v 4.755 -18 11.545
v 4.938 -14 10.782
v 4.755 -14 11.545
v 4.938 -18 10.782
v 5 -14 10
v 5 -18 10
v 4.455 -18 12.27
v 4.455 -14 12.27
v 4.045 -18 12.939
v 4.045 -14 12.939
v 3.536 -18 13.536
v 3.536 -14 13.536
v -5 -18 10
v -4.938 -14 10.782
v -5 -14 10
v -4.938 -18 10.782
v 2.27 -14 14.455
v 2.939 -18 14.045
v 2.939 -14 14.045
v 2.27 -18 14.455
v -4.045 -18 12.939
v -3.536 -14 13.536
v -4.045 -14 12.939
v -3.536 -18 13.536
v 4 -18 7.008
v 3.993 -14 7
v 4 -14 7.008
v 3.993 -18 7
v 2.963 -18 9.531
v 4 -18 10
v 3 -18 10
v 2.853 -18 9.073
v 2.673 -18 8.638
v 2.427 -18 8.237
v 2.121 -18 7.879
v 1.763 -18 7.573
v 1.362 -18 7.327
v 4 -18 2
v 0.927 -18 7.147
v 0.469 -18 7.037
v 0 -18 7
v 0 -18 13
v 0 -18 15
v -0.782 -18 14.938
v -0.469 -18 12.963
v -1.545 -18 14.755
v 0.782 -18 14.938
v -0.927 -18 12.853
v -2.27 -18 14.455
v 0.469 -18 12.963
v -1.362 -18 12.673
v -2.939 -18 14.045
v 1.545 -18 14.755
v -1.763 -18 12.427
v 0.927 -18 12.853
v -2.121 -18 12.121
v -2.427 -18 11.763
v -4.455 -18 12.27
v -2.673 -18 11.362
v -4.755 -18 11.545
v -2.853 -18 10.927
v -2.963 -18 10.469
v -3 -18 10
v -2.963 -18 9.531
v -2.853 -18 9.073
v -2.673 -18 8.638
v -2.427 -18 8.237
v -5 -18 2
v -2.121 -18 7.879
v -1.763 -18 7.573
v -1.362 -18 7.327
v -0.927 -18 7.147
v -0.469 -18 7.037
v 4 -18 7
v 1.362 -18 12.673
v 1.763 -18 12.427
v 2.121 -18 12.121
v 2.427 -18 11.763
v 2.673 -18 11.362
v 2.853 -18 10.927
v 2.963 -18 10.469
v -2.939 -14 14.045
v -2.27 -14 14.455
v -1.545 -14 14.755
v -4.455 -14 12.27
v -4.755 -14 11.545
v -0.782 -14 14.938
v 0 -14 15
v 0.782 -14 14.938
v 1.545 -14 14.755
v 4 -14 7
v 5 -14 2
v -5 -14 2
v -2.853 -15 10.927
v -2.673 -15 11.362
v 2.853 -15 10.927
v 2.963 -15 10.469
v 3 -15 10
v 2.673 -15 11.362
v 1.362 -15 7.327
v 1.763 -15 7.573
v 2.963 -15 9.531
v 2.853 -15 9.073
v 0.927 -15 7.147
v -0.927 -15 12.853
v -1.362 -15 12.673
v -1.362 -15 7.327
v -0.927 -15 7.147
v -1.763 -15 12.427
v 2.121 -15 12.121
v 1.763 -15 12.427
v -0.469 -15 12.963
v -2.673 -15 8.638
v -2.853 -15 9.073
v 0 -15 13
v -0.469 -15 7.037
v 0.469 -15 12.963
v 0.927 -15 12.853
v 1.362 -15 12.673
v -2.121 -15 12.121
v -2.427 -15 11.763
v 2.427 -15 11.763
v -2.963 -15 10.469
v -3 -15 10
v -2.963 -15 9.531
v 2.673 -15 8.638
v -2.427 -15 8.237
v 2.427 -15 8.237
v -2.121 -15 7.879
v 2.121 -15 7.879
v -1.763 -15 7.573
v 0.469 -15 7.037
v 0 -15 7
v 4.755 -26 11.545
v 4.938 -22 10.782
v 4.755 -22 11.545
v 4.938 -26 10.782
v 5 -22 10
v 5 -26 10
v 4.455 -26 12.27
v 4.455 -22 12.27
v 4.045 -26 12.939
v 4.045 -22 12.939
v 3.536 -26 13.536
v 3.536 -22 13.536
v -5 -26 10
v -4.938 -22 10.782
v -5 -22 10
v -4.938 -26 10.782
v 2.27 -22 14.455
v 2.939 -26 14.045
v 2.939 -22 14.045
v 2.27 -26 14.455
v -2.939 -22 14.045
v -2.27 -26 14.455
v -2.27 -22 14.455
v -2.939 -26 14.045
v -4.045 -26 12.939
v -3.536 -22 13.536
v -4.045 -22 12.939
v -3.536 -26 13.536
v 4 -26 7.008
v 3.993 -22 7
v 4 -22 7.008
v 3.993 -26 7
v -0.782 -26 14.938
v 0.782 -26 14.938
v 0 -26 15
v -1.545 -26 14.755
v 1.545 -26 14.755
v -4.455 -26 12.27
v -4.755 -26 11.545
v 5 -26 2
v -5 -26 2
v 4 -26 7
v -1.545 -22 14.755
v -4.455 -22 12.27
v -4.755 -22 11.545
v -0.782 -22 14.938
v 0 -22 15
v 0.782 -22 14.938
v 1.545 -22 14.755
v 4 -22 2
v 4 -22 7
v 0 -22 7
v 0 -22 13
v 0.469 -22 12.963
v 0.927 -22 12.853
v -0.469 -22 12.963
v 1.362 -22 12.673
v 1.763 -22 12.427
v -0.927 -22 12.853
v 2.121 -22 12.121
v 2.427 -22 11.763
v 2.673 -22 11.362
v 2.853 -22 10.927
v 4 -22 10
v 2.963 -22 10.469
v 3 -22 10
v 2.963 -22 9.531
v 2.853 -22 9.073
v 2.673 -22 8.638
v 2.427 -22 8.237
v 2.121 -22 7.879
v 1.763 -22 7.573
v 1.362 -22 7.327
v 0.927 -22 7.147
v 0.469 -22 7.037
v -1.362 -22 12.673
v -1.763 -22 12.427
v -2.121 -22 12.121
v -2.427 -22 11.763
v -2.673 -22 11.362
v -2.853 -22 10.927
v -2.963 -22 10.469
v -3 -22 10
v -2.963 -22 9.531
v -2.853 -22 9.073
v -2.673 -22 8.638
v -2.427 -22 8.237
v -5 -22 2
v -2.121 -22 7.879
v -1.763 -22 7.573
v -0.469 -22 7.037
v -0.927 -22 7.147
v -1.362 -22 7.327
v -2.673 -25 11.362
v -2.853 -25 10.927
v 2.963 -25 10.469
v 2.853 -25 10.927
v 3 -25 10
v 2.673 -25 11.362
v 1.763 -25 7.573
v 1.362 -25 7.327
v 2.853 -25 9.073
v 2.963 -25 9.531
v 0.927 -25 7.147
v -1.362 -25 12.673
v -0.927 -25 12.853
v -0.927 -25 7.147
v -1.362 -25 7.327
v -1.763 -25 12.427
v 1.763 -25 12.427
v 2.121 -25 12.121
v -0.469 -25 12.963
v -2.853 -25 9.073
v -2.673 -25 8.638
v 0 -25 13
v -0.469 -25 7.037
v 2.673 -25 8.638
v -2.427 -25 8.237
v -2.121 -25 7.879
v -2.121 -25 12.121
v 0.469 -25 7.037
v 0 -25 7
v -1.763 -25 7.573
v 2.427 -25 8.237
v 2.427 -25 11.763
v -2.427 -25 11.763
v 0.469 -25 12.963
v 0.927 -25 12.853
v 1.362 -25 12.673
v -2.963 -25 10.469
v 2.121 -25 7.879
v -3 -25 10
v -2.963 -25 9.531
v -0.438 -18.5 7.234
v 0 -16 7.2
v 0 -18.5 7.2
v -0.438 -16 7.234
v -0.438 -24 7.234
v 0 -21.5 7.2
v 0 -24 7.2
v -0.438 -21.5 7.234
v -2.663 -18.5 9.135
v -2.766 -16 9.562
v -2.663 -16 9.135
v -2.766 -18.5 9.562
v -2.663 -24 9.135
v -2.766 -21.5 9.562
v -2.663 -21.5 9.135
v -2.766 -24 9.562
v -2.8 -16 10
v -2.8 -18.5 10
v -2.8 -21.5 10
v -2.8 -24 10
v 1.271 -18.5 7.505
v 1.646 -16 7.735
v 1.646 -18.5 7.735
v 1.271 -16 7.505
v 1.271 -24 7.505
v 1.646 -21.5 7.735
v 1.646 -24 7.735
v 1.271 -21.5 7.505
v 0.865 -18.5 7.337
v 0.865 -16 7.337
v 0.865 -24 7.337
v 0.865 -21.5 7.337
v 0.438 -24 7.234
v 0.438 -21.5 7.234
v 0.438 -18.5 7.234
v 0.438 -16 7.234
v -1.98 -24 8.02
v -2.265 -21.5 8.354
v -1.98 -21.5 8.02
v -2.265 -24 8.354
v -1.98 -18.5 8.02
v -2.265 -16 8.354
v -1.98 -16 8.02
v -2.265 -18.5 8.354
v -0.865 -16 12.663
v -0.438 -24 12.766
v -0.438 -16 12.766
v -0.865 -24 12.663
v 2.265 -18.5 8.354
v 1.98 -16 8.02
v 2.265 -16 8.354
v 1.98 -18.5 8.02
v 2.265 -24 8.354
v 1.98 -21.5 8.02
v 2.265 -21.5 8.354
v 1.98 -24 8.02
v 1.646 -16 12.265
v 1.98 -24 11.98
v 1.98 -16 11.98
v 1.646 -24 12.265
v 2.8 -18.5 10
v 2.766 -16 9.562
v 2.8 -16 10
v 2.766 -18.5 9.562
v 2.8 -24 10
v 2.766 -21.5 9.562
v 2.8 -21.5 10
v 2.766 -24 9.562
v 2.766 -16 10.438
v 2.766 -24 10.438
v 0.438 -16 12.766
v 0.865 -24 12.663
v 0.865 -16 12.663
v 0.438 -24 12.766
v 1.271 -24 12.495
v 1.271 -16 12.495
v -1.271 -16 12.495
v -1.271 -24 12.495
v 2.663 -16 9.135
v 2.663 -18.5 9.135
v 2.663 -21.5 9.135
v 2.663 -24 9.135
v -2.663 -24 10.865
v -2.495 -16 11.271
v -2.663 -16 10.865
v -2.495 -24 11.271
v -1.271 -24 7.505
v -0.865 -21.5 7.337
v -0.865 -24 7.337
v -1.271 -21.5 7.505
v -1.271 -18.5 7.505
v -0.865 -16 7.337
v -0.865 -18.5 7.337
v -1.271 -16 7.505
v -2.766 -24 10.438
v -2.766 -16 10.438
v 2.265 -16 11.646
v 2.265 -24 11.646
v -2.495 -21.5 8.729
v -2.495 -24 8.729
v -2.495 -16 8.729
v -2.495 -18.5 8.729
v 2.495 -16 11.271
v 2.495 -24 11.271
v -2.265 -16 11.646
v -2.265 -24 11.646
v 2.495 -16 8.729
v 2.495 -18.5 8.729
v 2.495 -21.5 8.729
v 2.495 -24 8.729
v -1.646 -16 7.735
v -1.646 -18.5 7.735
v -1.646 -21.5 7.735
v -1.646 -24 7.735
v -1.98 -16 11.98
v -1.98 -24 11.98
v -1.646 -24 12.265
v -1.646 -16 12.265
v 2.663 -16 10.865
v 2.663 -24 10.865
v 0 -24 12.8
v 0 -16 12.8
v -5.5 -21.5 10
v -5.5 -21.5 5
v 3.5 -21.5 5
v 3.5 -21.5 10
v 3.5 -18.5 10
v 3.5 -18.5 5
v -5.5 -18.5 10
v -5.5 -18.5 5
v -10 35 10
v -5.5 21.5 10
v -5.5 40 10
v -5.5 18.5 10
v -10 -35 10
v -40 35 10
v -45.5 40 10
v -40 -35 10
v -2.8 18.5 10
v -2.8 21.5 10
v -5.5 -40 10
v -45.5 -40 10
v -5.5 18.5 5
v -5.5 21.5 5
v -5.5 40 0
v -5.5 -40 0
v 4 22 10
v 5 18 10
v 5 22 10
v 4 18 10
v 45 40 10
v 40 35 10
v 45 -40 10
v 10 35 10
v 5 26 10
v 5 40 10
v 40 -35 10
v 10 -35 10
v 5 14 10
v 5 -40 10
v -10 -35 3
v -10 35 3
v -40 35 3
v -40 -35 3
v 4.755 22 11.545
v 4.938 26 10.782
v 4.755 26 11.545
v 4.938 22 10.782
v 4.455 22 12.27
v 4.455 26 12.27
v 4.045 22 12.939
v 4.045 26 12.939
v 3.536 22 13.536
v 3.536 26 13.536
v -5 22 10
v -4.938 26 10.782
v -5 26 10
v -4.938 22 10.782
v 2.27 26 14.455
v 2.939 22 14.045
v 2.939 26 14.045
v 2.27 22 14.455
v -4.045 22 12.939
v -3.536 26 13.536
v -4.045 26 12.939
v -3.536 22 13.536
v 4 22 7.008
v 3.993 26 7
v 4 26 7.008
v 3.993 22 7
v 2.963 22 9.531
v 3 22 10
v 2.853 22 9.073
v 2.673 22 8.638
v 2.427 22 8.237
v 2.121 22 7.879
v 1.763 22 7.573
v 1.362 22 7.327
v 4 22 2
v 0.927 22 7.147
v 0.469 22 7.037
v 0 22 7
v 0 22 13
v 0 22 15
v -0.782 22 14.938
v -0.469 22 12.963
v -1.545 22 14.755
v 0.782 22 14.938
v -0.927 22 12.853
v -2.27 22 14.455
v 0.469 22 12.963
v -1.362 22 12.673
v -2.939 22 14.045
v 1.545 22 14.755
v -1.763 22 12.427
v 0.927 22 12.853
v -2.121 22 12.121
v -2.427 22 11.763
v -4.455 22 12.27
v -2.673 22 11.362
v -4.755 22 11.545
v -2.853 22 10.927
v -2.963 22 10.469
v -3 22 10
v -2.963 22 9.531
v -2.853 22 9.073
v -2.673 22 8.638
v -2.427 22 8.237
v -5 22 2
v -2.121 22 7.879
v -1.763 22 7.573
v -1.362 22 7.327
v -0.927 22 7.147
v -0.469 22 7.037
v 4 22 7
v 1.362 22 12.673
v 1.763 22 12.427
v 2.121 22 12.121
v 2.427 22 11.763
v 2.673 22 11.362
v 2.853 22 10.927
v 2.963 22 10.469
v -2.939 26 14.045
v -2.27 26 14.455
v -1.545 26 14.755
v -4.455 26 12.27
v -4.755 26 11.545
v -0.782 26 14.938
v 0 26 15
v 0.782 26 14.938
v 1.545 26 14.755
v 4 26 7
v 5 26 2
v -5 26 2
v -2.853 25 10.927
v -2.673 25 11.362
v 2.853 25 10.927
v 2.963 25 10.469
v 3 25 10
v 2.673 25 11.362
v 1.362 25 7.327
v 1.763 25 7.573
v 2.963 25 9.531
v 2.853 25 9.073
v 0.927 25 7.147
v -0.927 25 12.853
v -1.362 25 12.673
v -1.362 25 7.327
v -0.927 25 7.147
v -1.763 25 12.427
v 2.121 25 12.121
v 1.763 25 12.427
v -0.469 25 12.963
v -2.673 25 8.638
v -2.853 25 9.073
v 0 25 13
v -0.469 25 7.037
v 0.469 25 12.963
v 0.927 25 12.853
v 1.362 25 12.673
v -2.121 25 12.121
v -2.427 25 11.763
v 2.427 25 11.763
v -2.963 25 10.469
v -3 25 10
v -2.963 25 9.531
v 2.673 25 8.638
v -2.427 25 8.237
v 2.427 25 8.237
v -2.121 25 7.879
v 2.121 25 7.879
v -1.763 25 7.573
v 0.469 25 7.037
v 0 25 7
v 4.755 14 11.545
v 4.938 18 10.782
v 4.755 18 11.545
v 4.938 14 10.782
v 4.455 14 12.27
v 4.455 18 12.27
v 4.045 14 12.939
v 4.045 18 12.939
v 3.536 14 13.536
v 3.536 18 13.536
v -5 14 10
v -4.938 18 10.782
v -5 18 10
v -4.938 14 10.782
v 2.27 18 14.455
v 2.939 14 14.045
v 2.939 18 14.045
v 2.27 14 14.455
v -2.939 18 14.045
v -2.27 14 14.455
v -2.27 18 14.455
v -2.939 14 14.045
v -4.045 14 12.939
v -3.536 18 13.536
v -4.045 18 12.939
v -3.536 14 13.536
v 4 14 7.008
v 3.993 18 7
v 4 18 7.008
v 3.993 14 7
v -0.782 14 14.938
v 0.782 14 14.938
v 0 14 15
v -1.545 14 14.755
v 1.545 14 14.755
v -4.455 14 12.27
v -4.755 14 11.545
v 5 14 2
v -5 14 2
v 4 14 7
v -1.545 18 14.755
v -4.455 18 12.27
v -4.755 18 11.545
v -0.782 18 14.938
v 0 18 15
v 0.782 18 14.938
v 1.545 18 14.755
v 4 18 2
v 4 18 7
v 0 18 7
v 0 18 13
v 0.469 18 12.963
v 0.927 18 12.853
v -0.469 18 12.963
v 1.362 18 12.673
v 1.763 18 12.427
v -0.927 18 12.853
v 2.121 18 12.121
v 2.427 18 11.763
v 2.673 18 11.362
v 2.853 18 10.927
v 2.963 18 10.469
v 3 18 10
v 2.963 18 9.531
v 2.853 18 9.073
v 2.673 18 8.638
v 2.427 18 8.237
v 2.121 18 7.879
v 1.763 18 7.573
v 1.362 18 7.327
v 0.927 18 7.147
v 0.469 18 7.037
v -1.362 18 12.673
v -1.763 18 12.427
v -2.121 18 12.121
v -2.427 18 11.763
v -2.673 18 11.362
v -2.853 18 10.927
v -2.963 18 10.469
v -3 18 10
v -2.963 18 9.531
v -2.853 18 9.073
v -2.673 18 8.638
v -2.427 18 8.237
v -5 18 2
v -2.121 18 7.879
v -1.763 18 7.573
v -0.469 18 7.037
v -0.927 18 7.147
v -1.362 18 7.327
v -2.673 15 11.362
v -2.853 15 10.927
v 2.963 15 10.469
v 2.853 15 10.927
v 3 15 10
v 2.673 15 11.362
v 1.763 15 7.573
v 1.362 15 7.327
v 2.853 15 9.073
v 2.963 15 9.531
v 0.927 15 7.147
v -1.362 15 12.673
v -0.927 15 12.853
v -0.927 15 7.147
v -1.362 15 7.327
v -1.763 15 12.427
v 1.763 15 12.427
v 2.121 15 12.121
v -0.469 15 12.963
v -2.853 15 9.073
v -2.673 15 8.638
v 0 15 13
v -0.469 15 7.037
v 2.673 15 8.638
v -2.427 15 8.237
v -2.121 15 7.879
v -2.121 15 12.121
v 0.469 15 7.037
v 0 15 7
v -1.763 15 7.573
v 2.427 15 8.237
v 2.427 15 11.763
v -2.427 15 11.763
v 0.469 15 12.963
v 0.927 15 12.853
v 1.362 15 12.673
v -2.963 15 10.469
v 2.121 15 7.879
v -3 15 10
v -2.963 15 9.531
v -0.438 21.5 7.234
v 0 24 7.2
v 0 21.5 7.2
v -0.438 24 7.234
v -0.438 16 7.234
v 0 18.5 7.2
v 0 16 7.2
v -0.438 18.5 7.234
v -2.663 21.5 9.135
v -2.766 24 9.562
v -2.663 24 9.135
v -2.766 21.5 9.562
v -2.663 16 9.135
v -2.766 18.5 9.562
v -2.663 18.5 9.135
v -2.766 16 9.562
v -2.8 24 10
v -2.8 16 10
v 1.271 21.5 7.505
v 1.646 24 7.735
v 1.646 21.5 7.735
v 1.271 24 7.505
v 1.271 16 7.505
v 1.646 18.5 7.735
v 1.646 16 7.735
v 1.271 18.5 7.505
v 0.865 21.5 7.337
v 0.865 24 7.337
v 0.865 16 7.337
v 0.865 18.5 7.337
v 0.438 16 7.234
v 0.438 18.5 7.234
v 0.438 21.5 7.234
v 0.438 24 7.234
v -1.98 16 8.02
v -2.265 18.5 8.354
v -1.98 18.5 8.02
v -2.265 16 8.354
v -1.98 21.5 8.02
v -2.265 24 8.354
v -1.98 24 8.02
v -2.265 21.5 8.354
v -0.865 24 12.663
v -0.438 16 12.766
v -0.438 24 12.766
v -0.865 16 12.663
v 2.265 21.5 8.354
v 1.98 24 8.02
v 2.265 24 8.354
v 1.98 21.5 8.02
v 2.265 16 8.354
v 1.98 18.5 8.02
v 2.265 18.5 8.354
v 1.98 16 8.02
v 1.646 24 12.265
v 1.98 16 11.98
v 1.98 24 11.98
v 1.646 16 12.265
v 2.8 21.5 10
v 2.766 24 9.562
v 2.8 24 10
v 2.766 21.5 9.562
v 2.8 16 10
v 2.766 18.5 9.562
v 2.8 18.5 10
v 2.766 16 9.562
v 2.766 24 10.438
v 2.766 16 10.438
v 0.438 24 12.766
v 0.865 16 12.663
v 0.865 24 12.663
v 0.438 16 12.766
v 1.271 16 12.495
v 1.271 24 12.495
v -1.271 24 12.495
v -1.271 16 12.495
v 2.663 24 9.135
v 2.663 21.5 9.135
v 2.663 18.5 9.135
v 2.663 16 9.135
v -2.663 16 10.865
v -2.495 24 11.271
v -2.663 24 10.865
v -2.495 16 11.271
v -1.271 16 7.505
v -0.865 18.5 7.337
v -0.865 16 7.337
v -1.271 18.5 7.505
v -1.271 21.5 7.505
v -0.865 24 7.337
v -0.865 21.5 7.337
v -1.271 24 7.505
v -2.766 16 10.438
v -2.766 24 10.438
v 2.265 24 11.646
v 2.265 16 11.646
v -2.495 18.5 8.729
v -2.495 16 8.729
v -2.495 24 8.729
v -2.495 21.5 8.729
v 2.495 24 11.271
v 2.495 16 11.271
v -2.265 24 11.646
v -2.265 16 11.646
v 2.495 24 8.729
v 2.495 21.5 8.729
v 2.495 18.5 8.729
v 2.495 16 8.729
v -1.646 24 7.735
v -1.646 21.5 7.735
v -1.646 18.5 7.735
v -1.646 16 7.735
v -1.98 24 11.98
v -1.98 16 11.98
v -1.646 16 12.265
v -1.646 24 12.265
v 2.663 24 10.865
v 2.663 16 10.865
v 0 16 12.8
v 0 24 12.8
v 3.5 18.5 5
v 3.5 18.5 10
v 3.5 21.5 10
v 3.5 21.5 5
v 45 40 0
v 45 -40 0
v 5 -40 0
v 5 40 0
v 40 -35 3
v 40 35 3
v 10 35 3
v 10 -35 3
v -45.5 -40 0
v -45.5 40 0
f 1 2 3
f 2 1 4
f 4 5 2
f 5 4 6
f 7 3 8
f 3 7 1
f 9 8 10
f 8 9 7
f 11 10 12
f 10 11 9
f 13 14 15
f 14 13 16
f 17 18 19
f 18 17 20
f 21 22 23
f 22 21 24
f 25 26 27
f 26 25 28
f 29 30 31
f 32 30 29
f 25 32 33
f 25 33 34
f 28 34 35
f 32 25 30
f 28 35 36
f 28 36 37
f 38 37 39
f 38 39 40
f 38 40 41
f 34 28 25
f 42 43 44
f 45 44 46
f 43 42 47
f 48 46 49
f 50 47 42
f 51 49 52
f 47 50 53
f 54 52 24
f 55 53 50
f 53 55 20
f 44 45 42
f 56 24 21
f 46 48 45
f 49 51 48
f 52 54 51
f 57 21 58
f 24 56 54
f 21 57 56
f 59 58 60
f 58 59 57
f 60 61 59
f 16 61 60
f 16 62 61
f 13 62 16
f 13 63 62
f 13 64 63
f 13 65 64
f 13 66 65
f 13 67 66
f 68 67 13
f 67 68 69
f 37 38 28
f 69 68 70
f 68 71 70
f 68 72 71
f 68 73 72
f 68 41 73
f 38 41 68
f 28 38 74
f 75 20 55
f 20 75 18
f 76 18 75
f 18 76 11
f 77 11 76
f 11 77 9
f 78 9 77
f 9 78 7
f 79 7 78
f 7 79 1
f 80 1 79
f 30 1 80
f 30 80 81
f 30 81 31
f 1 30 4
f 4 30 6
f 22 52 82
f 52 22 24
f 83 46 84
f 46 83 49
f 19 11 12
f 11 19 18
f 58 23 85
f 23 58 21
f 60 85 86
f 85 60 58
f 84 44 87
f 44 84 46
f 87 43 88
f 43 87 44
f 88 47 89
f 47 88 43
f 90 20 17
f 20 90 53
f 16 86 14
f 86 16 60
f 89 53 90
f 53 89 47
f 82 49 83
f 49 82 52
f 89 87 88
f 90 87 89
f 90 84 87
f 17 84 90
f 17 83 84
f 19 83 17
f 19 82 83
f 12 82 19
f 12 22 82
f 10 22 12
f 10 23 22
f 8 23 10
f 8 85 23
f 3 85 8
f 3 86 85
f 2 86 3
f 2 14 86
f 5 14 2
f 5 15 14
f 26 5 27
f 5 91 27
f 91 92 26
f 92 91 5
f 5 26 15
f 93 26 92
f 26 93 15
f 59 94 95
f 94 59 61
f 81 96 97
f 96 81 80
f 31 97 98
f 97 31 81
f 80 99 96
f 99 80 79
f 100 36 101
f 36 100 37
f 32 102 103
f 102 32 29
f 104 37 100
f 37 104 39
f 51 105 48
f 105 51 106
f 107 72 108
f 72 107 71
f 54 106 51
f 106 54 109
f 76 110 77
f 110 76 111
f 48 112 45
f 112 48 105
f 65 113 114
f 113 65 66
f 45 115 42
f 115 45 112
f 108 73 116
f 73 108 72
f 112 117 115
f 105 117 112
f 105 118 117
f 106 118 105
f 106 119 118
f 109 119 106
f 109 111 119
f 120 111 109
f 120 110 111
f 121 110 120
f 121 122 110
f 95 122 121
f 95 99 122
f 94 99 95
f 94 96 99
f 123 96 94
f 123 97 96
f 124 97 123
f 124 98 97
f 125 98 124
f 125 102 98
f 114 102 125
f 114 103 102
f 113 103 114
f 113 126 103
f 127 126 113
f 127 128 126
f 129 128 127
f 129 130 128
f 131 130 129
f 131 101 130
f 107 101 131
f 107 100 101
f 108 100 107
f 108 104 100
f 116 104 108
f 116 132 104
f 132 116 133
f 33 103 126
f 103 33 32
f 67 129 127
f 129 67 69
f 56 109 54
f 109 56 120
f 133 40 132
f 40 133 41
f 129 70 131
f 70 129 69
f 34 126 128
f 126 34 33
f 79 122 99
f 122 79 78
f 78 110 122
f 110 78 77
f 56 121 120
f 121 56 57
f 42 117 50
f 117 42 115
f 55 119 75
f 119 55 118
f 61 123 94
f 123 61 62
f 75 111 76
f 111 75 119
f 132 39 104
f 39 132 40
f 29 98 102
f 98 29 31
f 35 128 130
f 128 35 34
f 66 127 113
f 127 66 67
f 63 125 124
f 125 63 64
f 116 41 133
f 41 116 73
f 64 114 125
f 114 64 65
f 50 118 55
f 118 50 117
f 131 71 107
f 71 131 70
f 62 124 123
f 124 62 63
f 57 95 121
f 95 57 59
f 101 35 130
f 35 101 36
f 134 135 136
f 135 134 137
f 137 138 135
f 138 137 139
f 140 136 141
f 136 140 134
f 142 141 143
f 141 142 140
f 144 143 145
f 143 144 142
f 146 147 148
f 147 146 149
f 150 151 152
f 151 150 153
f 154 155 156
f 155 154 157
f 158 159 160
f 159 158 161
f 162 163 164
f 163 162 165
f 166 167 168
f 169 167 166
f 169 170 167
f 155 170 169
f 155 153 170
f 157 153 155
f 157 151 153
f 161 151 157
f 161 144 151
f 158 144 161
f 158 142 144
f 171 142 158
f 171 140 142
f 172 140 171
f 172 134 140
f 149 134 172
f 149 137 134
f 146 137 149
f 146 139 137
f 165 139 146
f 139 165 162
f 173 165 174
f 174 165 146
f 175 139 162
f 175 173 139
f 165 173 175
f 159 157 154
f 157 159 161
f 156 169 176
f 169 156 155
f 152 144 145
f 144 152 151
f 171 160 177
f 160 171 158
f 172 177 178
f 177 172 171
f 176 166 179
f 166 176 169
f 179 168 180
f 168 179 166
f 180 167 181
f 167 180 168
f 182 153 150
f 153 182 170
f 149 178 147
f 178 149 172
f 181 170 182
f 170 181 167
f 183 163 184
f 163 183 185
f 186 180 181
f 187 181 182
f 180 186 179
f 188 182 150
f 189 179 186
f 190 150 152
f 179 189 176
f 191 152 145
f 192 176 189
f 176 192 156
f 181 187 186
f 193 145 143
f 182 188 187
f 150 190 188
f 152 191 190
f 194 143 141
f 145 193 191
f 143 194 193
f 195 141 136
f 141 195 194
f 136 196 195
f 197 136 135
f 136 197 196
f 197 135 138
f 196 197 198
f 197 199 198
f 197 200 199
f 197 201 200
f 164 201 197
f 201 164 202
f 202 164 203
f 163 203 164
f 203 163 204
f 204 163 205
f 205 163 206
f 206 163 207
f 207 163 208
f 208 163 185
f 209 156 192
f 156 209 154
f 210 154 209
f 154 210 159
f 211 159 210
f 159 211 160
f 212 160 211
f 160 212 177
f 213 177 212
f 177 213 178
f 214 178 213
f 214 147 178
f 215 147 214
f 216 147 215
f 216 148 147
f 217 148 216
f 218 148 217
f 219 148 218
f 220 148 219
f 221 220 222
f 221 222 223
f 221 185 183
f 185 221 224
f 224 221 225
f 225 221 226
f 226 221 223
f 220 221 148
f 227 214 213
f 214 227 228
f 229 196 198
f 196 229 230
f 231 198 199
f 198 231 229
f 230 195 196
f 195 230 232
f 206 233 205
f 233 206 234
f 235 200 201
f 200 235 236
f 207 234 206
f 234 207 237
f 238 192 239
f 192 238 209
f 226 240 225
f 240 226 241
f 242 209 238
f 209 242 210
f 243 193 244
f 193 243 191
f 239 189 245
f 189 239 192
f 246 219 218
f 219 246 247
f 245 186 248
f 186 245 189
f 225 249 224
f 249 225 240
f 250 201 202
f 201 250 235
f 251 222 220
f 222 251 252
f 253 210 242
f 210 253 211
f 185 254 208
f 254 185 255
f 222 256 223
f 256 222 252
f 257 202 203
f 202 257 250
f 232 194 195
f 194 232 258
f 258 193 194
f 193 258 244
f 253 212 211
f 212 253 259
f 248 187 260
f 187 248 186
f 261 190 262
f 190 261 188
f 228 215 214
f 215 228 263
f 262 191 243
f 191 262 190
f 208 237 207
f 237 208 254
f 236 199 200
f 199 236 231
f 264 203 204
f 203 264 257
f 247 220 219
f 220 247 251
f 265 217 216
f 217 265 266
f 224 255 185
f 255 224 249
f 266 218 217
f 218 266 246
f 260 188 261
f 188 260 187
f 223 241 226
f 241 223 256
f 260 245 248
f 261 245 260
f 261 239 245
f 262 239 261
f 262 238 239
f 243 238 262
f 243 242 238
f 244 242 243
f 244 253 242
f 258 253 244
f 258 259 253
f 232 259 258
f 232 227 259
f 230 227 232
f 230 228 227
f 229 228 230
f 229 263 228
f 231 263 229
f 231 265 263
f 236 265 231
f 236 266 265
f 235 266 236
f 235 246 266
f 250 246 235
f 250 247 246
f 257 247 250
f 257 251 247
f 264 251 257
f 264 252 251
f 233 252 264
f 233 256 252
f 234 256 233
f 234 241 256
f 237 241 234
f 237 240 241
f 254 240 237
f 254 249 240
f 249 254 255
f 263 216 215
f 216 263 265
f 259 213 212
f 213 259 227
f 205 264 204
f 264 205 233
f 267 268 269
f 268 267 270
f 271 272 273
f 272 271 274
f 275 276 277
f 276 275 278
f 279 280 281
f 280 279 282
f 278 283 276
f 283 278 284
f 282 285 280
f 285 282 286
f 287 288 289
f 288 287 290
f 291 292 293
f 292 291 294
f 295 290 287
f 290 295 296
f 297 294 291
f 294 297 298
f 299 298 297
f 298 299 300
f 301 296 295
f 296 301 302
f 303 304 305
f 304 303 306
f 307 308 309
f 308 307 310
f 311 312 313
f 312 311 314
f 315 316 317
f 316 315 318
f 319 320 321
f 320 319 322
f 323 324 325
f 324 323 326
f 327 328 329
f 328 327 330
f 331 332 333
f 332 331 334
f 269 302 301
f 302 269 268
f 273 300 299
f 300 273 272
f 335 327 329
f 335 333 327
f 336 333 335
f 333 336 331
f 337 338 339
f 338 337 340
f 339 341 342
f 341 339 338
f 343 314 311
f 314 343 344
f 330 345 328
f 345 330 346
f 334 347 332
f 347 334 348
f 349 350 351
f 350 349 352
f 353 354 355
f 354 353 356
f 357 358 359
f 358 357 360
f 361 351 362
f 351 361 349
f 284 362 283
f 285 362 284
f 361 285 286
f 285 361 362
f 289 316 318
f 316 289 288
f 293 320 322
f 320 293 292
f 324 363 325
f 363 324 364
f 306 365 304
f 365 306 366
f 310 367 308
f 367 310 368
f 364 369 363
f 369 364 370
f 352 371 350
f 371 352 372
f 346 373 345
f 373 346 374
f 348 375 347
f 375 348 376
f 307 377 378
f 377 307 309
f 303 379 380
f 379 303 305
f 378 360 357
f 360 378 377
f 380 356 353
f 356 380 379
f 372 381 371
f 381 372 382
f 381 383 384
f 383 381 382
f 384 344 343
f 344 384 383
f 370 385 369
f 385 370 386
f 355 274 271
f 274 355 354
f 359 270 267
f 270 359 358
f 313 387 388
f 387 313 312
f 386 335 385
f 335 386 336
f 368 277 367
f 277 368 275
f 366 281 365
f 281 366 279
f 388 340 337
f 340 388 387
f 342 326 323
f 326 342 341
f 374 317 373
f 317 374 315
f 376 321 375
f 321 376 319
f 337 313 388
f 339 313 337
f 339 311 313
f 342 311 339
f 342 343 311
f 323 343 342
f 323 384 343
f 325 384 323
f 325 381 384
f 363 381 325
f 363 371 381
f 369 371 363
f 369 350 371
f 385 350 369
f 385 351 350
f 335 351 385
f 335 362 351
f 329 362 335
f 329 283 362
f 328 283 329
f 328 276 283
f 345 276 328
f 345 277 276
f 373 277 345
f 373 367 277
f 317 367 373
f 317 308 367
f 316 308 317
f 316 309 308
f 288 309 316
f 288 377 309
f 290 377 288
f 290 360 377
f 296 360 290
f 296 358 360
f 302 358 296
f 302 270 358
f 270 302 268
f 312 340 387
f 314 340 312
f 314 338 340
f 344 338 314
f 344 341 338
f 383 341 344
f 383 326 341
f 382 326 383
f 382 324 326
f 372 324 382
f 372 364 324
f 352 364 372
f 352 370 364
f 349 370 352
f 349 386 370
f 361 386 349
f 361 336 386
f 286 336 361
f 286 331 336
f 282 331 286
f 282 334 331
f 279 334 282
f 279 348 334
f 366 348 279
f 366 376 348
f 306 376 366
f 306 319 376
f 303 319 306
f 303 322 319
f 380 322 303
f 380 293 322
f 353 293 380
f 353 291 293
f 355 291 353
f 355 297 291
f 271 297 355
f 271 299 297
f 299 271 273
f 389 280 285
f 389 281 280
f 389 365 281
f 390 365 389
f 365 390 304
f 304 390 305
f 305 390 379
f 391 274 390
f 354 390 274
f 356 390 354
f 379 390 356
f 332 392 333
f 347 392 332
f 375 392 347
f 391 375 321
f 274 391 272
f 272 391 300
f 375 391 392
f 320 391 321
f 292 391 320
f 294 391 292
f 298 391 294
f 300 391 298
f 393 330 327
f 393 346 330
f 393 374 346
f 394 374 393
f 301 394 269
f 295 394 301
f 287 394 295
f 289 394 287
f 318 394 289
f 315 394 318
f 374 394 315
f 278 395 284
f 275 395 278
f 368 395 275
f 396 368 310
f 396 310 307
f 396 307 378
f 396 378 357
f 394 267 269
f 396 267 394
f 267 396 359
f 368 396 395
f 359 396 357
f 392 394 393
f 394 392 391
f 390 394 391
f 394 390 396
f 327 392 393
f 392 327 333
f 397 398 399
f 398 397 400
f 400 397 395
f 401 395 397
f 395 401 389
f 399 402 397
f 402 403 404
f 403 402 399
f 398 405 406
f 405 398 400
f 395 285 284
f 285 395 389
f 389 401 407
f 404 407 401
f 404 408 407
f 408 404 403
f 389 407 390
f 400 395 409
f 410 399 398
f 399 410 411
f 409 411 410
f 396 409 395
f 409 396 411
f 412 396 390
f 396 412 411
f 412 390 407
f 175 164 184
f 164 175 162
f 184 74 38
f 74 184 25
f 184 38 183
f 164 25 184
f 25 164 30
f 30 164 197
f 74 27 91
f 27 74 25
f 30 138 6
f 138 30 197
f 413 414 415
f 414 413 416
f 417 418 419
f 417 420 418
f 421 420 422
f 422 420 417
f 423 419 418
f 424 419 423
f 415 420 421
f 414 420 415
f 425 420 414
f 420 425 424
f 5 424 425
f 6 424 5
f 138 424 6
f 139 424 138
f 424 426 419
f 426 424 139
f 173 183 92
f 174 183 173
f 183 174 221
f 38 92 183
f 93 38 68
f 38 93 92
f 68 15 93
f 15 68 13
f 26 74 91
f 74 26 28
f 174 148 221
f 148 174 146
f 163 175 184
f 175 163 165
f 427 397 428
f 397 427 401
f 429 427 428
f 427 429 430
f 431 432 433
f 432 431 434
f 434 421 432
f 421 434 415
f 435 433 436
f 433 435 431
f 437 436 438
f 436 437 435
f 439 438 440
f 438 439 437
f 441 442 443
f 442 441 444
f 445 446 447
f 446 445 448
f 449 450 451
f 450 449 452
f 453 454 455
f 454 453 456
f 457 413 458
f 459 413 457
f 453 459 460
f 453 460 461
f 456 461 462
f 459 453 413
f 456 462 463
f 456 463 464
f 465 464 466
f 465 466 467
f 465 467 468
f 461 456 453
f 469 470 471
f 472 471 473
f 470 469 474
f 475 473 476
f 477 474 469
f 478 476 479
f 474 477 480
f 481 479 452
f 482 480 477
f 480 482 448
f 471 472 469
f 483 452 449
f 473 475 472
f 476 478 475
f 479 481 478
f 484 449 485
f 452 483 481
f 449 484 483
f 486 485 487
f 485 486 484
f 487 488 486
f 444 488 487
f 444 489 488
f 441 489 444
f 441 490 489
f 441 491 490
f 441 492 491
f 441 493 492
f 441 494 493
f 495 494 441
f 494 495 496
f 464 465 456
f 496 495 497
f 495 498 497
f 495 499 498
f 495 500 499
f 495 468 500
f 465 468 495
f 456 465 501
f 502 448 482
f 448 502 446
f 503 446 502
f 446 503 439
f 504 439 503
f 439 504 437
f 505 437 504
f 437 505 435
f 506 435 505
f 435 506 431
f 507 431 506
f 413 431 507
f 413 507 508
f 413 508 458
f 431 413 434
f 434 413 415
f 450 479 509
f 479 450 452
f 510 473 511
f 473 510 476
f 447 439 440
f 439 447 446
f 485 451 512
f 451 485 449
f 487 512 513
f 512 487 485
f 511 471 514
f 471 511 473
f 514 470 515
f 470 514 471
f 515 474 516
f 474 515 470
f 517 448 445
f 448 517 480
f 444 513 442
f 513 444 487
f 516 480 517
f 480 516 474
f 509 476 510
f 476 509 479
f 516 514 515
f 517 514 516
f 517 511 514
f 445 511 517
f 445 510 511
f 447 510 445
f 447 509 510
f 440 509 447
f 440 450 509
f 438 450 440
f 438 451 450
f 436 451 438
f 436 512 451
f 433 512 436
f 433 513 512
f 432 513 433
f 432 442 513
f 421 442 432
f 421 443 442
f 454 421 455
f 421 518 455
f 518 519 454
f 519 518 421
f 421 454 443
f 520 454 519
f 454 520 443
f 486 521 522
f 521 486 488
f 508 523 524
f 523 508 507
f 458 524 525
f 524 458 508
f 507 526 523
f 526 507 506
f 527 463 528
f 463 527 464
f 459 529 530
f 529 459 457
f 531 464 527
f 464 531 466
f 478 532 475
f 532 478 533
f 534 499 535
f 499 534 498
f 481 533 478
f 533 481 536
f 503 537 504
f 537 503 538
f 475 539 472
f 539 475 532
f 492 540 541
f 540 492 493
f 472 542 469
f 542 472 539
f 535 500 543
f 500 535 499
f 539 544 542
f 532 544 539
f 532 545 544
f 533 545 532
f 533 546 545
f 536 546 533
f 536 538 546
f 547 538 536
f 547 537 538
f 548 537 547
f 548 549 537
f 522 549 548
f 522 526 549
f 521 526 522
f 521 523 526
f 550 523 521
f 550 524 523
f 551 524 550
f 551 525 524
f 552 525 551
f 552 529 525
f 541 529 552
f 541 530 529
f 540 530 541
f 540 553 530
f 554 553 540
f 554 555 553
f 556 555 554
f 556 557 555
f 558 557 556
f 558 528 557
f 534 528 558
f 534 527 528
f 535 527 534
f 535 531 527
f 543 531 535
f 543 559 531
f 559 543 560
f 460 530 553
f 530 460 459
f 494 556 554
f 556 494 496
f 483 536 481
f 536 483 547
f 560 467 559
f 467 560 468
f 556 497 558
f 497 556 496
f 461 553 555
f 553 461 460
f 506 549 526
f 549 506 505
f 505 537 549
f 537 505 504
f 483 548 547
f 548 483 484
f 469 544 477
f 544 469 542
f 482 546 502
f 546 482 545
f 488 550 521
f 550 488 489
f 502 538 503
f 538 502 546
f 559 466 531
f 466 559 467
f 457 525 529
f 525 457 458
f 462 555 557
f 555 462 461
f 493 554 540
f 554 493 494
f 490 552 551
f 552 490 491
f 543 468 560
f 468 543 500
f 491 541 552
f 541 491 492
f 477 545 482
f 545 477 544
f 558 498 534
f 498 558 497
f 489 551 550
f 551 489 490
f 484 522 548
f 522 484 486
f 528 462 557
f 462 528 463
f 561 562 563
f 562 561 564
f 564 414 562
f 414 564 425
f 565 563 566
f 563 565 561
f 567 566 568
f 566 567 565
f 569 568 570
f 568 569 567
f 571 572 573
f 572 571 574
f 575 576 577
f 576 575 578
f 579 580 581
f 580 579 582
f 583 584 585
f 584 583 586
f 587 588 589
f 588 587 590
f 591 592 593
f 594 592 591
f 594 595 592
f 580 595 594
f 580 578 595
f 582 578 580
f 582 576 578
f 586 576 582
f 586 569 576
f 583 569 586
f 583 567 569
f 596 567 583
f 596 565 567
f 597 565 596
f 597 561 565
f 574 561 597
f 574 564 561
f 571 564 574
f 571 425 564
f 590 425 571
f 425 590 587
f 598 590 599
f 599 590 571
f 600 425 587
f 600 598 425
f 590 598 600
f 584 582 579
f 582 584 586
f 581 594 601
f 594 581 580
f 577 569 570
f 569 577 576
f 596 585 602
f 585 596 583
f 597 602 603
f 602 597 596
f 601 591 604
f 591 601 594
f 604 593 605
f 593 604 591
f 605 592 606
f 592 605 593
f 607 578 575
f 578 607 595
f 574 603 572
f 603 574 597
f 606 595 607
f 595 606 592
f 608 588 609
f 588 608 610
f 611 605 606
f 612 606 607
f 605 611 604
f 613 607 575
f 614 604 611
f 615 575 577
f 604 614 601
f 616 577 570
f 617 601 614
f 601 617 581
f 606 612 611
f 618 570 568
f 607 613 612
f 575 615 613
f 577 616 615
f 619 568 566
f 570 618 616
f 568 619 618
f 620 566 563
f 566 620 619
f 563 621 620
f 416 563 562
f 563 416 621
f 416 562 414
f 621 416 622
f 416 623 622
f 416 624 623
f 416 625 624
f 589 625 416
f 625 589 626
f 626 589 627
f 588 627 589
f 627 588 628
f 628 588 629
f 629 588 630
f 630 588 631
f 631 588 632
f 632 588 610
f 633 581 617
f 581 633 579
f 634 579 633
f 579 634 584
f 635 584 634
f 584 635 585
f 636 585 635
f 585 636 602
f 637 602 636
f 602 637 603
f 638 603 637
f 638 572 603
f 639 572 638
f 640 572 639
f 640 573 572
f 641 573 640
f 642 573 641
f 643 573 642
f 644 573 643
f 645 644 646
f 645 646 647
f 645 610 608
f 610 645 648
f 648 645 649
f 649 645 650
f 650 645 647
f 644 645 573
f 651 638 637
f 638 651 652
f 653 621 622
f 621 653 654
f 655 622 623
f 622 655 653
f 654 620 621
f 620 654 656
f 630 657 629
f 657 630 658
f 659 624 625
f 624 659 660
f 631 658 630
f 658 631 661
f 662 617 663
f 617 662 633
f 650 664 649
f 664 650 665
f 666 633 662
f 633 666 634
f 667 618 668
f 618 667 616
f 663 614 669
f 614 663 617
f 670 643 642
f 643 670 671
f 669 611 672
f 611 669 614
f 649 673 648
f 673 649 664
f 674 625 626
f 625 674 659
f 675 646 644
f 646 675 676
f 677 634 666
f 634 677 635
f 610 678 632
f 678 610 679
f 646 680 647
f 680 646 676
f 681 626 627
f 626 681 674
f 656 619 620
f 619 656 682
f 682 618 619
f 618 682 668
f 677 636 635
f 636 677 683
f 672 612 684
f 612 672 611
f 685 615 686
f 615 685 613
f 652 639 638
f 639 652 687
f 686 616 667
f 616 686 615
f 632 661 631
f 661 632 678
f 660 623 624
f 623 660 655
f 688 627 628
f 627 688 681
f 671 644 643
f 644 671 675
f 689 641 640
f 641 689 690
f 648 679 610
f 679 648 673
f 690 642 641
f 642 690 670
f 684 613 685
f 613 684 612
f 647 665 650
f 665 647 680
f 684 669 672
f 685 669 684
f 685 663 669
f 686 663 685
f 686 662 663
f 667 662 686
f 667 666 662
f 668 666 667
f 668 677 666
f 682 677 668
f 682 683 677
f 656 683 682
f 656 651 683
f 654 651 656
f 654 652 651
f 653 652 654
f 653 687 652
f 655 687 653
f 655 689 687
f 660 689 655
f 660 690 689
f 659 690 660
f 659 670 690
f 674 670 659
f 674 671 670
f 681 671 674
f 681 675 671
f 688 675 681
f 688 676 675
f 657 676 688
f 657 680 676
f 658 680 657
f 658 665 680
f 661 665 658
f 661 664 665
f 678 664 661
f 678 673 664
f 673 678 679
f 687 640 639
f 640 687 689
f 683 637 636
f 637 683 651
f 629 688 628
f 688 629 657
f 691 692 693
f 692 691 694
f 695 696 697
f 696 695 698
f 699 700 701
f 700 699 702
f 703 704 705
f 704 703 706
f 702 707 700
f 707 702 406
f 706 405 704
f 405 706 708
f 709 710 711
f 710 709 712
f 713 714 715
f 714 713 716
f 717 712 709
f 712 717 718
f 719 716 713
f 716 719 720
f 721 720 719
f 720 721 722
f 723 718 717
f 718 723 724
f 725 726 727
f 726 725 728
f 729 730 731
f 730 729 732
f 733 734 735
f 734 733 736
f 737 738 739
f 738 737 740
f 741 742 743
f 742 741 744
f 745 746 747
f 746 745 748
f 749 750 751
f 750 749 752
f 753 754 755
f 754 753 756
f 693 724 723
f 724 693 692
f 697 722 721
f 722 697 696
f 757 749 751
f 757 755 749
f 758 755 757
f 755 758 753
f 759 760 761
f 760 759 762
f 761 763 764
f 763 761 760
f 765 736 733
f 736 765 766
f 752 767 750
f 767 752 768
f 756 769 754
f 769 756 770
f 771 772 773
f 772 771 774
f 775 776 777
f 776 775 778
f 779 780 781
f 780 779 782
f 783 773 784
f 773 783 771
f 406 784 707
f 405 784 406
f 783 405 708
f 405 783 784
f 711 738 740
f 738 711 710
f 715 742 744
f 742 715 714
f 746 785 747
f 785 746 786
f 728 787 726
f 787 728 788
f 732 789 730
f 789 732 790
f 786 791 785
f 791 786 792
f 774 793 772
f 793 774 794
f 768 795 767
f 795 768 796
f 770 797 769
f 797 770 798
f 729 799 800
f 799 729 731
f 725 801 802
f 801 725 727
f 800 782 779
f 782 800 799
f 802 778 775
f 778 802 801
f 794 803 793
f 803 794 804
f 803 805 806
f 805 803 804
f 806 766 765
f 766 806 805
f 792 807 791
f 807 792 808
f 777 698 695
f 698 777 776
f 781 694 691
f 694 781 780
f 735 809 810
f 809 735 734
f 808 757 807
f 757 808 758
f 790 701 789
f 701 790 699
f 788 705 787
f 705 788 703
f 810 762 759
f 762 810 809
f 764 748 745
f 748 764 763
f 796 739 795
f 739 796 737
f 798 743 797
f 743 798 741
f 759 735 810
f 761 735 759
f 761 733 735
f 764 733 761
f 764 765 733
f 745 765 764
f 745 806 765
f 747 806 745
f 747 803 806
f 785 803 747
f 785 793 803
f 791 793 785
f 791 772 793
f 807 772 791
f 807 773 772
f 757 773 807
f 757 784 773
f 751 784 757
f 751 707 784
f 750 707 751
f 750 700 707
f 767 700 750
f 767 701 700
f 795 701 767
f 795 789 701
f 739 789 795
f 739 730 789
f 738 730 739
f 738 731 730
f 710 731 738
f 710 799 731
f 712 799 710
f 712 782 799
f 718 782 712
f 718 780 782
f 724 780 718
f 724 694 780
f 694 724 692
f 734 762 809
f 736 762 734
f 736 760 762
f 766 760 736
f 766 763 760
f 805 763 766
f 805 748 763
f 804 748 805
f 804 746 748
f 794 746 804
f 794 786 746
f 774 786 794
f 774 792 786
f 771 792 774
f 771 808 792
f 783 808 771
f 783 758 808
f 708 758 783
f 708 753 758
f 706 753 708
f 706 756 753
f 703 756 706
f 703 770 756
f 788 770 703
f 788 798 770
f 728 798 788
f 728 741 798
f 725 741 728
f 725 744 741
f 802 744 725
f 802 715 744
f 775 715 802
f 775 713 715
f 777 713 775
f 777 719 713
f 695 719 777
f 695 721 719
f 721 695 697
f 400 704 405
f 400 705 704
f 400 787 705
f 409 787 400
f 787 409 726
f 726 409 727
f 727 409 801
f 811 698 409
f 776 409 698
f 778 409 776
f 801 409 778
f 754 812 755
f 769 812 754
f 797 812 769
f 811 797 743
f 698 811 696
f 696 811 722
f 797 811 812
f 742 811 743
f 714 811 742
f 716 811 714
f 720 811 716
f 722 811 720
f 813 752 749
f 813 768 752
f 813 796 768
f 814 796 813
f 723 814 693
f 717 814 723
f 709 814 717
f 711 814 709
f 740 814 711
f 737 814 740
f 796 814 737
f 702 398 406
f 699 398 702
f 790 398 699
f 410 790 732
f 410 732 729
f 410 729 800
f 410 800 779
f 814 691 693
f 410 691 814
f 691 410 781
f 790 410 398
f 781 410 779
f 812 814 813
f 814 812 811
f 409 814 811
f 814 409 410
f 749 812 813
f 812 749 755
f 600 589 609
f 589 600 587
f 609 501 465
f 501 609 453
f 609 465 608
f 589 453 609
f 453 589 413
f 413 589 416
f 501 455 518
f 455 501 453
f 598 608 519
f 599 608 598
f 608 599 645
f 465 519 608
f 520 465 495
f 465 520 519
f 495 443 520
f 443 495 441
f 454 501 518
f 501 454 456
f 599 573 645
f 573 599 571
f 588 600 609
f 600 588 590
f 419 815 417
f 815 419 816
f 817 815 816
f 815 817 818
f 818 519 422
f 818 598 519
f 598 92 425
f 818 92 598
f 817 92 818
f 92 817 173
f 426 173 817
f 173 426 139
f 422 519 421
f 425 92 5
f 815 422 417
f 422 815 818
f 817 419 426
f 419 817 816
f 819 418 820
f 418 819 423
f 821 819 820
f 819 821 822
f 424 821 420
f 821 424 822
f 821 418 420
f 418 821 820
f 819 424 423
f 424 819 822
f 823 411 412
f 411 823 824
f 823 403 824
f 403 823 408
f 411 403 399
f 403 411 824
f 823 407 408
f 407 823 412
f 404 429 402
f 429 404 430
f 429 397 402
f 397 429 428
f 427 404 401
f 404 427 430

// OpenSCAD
// file: hinge.scad
$fn=40;

module hinge() {
    flap_length = 5;
    flap_thickness = 8;
    min_flap_thickness = 5;

    
    translate([0,6,5])
    rotate([90,0,0]) {
        
        
        // female hinge cylinder bottom cap
        // bottom is filled 1, then 3 is empty
        difference() {
            cylinder(4, r=5);

            translate([0,0,1])
            cylinder(4, r=3);
        }

        // female hinge cylinder top cap
        // top is filled 1, then 3 is empty
        // hovering 4mm above the bottom female cylinder
        difference() {
            translate([0, 0, 8])
            cylinder(4, r=5);

            translate([0, 0, 7])
            cylinder(4, r=3);
        }

        // female flap
        
        translate([4, -flap_thickness, 0])
        cube([flap_length, flap_thickness, 12]);

        // connect flap to cylinder
        translate([-5,-flap_thickness,0])
        cube([9.5, flap_thickness - 3, 4]);
        
        //square off corner
        translate([-5,-5,0])
        cube([2, 5, 4]);

        // connect flap to cylinder
        translate([-5,-flap_thickness,8])
        cube([9.5, flap_thickness - 3, 4]);
        
        translate([-5,-5,8])
        cube([2, 5, 4]);
        //square off corner



        // open position
        rotate([0,0,180]) {
            // male hinge cylinder middle
            // 1-fill, 1 gap, 2, 4, 2, 1 gap, 1 fill.
            translate([0, 0, 2])
            cylinder(8, r=2.8);

            // thin rect to connect flap to cylinder
            translate([-3.5, 0, 4.5])
            cube([11, min_flap_thickness, 3]);

            // flap from male hinge
            translate([5.5, 0, 0])
            cube([flap_length, flap_thickness, 12]);
        }
        
        
    }
}

hinge();
// main file
use <hinge.scad>


module big_tray() {
    translate([10,-35,3])
    cube([30,70,10]);
}

difference() {
    translate([0,-20,5])
    hinge();
    
    big_tray();
    
    translate([-50,0,0])
    big_tray();
}

difference() {
    translate([0,20,5])
    hinge();
    
    big_tray();
    
    translate([-50,0,0])
    big_tray();
}
difference() {
    translate([5,-40,0])
    cube([40,80,10]);
    
    big_tray();

}

difference() {
    translate([-45.5,-40,0])
    cube([40,80,10]);
    
    translate([-50,0,0])
    big_tray();
}
